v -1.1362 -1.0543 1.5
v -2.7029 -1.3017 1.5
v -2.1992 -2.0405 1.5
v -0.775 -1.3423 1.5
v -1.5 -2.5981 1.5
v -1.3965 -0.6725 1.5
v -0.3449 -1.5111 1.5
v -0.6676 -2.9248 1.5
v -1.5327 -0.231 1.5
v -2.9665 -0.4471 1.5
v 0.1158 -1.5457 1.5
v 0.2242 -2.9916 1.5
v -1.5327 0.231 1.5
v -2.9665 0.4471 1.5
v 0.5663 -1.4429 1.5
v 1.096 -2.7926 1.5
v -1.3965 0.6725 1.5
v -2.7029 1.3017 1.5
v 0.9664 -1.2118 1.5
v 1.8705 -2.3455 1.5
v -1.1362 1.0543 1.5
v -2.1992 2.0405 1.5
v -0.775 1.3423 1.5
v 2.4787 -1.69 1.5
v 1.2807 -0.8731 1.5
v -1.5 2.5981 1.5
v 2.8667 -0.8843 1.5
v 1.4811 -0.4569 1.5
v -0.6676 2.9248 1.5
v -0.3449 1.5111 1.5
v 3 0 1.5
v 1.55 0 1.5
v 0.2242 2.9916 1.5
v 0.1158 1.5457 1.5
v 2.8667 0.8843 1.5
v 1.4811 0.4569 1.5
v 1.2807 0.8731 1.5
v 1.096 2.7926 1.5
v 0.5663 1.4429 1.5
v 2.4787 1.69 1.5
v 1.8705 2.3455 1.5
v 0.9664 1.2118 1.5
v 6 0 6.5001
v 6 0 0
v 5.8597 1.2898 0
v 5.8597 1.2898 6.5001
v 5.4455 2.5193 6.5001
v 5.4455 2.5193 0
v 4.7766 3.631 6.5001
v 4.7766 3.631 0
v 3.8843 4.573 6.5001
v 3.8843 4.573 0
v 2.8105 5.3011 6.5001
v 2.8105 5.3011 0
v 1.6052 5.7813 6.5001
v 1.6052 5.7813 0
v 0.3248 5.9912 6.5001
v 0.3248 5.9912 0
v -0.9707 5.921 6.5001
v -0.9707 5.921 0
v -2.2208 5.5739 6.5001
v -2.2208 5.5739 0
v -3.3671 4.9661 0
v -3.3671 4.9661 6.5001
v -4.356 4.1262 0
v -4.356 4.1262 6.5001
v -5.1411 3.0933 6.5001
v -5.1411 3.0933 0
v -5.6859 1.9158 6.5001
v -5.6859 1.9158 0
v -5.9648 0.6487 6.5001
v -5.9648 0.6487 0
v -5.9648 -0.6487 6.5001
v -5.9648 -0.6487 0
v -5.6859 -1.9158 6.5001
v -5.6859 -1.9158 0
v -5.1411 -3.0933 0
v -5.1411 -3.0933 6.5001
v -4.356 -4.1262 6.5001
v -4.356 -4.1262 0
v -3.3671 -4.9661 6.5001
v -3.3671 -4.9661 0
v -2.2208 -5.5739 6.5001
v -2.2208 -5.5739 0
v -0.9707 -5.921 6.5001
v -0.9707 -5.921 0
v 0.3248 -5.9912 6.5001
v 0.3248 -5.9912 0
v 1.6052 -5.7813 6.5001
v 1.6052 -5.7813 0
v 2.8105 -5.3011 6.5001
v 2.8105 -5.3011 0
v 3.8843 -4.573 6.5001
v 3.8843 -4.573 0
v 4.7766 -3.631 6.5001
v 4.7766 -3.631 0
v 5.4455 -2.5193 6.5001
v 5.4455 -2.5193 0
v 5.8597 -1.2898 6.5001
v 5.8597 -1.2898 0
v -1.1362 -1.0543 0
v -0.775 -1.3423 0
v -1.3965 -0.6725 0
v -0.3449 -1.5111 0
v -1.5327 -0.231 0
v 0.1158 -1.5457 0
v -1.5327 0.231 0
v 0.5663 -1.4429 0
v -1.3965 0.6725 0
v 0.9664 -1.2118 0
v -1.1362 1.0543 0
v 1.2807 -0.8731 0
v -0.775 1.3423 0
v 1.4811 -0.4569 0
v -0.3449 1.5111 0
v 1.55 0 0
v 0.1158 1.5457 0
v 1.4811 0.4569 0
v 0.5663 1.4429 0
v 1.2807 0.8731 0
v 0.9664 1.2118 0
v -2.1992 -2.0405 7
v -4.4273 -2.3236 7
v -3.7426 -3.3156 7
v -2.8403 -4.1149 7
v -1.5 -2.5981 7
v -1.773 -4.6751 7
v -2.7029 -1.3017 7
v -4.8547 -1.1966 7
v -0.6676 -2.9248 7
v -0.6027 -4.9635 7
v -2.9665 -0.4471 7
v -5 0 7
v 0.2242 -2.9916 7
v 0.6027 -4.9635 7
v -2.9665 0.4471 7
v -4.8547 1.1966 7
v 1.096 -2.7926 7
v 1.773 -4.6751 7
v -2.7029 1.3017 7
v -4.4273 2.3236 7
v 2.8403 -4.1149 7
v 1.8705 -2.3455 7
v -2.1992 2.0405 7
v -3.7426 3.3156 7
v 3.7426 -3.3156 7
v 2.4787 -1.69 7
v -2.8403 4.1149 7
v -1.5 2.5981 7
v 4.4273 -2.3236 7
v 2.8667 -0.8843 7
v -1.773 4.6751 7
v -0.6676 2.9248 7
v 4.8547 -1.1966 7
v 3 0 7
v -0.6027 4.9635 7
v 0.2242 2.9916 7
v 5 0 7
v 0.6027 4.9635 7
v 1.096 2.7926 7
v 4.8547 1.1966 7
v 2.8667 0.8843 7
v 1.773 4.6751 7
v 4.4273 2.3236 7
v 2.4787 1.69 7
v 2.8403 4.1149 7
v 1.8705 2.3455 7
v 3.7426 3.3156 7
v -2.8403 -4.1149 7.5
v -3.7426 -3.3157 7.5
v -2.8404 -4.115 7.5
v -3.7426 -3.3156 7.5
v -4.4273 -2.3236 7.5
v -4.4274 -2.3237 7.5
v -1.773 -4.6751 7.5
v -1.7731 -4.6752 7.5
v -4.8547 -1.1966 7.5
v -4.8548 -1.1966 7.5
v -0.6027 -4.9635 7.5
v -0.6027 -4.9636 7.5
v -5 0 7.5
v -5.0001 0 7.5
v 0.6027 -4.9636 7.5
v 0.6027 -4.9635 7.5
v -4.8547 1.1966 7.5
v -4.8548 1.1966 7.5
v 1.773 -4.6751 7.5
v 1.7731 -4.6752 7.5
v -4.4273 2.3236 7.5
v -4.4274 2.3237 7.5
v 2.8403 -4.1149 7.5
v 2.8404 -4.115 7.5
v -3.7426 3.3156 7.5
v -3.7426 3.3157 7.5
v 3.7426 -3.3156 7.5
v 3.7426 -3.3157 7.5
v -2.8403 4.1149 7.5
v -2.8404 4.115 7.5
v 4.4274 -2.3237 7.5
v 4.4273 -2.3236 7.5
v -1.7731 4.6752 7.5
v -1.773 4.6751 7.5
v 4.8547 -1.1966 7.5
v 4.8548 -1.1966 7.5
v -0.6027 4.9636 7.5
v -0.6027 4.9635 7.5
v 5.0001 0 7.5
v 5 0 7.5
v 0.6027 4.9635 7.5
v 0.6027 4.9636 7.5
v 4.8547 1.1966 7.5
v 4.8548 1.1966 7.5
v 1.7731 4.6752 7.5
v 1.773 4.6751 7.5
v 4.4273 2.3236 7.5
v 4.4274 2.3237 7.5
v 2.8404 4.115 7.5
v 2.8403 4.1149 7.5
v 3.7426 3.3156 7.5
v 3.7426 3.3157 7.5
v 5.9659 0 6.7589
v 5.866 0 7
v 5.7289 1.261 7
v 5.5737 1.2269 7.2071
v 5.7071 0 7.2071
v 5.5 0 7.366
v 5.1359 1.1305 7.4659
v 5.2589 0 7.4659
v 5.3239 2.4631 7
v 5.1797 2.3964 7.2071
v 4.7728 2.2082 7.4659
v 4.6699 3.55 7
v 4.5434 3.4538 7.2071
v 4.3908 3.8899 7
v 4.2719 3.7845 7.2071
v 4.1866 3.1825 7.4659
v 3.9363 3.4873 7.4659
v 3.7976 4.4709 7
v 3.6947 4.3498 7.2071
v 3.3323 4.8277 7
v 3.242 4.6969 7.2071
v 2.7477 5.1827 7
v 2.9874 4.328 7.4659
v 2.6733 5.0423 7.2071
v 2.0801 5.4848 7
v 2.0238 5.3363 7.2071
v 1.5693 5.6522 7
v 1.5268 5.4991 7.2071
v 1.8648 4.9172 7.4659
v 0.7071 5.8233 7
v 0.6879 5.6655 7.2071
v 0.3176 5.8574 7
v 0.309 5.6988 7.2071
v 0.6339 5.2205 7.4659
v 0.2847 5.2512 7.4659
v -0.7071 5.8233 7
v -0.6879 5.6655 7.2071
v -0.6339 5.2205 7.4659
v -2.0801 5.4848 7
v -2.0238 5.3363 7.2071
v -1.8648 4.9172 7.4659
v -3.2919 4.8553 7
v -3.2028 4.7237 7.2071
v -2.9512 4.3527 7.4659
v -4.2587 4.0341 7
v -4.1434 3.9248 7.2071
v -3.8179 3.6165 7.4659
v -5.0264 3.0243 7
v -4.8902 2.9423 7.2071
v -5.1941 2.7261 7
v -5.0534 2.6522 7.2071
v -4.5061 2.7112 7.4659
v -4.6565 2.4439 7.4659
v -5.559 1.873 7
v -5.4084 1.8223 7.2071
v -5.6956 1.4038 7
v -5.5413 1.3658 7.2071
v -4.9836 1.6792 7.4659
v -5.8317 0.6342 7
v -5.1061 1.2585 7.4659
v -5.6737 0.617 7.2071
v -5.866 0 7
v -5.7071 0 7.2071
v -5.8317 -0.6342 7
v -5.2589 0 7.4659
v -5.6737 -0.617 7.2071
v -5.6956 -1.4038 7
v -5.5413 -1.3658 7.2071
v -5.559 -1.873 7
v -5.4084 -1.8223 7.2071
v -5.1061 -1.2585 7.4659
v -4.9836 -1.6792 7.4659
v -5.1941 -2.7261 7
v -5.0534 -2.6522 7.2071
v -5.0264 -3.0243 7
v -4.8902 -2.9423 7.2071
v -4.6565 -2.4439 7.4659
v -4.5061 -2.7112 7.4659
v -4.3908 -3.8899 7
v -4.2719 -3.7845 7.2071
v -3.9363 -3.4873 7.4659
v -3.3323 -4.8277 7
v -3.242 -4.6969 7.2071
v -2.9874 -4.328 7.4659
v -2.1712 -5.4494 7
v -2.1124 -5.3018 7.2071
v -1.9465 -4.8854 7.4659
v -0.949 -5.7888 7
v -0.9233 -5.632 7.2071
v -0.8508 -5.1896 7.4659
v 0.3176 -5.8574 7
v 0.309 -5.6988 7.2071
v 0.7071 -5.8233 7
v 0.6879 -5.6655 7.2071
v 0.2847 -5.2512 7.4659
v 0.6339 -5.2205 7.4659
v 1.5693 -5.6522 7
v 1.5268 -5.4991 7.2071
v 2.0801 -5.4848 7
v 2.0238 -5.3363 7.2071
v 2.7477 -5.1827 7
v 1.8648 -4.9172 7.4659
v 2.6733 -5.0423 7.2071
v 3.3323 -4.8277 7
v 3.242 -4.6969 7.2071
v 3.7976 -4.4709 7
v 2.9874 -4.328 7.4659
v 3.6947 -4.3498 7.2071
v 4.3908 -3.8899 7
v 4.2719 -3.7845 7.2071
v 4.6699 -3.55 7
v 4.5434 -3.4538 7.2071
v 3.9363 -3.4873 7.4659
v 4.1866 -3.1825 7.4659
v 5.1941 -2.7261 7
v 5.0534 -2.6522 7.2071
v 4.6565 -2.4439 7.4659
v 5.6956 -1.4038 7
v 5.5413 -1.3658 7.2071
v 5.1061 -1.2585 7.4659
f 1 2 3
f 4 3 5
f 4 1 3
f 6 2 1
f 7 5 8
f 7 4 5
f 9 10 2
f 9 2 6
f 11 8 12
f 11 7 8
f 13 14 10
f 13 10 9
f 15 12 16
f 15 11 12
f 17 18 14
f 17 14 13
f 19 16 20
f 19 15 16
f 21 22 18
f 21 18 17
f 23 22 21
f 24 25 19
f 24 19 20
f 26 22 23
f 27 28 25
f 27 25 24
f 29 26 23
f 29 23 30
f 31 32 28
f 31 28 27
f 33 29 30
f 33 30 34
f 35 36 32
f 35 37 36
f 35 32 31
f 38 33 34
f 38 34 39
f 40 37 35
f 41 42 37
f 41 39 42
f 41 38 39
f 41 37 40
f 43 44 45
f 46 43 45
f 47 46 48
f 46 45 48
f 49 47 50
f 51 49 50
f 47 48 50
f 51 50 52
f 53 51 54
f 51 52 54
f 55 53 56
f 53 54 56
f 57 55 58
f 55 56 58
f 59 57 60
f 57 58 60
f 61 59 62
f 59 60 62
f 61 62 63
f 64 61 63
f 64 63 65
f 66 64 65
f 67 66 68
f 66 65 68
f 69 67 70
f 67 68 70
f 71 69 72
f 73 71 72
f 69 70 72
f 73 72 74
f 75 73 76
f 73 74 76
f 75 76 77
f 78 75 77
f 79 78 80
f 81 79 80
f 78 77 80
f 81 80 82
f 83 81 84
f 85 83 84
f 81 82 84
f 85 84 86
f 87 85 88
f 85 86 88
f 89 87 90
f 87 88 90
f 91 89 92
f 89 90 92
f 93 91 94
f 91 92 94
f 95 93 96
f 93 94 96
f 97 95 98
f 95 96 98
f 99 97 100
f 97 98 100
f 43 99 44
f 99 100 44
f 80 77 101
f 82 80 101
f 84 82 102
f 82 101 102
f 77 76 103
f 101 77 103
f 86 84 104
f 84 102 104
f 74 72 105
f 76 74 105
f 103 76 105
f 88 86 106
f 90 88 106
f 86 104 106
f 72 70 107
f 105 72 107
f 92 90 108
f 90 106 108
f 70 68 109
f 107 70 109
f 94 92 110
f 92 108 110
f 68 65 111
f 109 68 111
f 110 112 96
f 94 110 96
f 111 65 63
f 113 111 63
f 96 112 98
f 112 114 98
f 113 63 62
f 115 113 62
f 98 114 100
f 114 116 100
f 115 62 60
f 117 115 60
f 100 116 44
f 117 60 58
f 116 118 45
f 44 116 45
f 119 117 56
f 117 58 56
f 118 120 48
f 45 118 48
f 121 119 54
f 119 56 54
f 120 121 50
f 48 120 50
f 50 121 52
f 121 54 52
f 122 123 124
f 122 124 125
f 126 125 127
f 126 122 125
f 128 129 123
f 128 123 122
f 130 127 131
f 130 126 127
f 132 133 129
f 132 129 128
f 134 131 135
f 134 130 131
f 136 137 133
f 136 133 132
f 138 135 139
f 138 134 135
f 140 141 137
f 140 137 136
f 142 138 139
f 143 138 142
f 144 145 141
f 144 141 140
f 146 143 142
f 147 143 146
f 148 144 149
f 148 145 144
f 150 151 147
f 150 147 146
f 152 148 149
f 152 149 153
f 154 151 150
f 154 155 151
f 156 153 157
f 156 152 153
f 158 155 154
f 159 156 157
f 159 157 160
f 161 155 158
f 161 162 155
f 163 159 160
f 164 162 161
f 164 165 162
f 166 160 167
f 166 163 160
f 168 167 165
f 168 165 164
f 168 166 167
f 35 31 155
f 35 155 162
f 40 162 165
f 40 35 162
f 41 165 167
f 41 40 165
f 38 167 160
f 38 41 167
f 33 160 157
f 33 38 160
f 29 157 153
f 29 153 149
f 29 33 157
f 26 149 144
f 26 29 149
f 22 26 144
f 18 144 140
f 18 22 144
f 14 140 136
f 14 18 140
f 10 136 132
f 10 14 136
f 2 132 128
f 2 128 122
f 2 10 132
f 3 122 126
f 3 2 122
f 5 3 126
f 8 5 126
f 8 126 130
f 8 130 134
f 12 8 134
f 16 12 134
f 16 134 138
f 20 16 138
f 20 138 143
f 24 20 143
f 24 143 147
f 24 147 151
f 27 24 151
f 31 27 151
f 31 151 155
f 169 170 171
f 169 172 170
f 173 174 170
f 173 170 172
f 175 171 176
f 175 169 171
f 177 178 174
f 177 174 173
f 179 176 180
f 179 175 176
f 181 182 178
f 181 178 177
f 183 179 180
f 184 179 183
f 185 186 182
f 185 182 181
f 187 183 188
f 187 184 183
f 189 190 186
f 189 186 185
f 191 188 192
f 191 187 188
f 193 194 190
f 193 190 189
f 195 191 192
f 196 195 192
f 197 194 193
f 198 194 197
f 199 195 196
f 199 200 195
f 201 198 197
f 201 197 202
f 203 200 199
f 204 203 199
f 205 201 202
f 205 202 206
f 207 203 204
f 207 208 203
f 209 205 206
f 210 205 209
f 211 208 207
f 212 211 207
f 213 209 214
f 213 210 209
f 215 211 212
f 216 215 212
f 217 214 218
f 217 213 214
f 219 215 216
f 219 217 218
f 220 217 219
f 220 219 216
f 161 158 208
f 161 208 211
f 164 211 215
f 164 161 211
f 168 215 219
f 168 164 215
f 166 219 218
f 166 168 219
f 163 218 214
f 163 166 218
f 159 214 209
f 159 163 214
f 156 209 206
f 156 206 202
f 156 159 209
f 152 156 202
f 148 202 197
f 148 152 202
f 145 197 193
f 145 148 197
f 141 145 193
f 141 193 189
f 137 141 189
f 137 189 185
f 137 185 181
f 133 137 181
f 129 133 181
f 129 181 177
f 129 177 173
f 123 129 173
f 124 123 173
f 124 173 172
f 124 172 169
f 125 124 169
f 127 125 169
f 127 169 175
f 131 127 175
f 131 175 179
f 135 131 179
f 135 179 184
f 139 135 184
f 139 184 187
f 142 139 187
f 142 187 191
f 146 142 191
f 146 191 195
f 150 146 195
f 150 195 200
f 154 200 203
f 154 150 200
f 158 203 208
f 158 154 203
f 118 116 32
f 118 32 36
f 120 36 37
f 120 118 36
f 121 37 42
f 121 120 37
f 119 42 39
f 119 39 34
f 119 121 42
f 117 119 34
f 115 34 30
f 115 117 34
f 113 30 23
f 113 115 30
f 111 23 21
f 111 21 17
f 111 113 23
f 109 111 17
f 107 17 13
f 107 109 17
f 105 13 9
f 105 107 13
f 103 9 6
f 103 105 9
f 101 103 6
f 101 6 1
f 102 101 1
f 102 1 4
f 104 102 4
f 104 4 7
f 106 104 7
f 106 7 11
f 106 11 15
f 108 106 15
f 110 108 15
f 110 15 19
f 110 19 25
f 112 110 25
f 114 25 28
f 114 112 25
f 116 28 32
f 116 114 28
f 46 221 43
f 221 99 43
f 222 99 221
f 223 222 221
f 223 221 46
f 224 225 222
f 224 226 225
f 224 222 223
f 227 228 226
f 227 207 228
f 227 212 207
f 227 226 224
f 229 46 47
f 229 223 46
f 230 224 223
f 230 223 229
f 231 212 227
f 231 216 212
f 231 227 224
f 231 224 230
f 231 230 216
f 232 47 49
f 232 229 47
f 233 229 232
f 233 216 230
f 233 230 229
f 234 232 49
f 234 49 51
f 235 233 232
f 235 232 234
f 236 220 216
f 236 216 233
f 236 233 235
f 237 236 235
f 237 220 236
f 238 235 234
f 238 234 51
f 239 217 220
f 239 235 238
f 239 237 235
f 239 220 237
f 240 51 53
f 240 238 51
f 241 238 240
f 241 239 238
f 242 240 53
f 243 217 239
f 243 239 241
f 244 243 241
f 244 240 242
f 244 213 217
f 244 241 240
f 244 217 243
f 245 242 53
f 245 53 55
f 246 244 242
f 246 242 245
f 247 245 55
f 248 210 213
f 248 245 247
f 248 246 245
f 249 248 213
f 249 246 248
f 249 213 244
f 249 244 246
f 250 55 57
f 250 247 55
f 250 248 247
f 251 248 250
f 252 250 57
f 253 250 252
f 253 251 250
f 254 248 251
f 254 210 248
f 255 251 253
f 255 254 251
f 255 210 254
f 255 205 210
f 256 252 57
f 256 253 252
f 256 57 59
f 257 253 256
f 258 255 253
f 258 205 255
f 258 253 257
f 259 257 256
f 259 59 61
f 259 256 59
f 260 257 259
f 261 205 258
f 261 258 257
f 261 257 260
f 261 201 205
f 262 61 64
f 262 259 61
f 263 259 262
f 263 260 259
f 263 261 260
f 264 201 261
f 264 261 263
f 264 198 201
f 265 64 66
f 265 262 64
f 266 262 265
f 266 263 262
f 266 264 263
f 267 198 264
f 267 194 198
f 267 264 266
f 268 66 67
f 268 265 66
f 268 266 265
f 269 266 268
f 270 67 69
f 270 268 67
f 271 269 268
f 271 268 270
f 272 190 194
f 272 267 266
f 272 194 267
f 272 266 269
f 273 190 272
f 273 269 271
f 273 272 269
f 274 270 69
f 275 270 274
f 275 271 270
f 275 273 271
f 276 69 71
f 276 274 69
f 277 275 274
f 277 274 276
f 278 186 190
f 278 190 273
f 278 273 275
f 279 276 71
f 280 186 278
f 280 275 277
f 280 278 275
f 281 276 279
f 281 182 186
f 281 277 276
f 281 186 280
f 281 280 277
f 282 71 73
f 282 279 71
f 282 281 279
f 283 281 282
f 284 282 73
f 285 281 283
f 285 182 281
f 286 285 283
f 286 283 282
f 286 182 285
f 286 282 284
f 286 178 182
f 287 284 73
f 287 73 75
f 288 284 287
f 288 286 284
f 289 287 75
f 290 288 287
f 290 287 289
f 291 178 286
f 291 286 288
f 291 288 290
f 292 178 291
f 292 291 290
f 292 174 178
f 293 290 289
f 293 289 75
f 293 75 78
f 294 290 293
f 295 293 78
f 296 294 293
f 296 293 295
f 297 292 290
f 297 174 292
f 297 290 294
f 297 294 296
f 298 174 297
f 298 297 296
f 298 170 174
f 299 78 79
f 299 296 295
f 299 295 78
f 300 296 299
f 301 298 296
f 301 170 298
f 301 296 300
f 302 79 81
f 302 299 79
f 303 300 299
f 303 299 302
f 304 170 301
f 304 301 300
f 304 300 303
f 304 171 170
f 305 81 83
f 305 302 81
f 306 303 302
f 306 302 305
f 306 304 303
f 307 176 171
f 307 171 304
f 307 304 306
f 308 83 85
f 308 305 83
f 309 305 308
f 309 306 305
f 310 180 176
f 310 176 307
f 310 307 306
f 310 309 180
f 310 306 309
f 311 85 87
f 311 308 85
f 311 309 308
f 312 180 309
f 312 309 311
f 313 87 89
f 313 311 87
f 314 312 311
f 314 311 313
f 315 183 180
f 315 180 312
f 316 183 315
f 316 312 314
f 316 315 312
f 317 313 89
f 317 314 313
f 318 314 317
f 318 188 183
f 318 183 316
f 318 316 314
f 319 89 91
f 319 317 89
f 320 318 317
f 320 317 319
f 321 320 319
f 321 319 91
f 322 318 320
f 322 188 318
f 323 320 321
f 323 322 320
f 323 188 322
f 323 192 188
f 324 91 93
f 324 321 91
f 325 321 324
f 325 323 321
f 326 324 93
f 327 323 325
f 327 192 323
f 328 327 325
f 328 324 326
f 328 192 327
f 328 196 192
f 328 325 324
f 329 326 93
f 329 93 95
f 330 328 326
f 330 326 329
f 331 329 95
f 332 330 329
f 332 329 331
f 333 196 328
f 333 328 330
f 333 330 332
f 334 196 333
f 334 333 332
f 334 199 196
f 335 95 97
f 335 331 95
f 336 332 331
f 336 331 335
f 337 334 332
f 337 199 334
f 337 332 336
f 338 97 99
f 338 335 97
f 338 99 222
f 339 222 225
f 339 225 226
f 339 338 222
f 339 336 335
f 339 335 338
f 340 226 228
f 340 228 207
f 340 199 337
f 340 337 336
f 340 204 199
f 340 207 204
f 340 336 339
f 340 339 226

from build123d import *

# Parameters (mm, degrees)
SKETCH1_R           = 3
SKETCH1_R_2         = 1.55
BOSS_EXTRUDE1_DEPTH = 1.5
SKETCH1_7_R         = 5
SKETCH1_7_R_2       = 3
BOSS_EXTRUDE3_DEPTH = 7
SKETCH1_9_R         = 6
SKETCH1_9_R_2       = 5
BOSS_EXTRUDE4_DEPTH = 7.5
FILLET1_R           = 1


with BuildPart() as part:
    # Sketch1 → Boss-Extrude1 (new body)
    with BuildSketch(Plane.XY):
        Circle(SKETCH1_R)
        Circle(SKETCH1_R_2, mode=Mode.SUBTRACT)
    extrude(amount=BOSS_EXTRUDE1_DEPTH)

    # Sketch1<7> → Boss-Extrude3 (add)
    with BuildSketch(Plane.XY):
        Circle(SKETCH1_7_R)
        Circle(SKETCH1_7_R_2, mode=Mode.SUBTRACT)
    extrude(amount=BOSS_EXTRUDE3_DEPTH)

    # Sketch1<9> → Boss-Extrude4 (add)
    with BuildSketch(Plane.XY):
        Circle(SKETCH1_9_R)
        Circle(SKETCH1_9_R_2, mode=Mode.SUBTRACT)
    extrude(amount=BOSS_EXTRUDE4_DEPTH)

    # Fillet1
    fillet1_edges = [part.edges().sort_by_distance(p)[0] for p in [
        (-6, 0, 7.5),
    ]]
    fillet(fillet1_edges, radius=FILLET1_R - 0.0001)  # a hair under: the kernel refuses the full size


solid = part.part
